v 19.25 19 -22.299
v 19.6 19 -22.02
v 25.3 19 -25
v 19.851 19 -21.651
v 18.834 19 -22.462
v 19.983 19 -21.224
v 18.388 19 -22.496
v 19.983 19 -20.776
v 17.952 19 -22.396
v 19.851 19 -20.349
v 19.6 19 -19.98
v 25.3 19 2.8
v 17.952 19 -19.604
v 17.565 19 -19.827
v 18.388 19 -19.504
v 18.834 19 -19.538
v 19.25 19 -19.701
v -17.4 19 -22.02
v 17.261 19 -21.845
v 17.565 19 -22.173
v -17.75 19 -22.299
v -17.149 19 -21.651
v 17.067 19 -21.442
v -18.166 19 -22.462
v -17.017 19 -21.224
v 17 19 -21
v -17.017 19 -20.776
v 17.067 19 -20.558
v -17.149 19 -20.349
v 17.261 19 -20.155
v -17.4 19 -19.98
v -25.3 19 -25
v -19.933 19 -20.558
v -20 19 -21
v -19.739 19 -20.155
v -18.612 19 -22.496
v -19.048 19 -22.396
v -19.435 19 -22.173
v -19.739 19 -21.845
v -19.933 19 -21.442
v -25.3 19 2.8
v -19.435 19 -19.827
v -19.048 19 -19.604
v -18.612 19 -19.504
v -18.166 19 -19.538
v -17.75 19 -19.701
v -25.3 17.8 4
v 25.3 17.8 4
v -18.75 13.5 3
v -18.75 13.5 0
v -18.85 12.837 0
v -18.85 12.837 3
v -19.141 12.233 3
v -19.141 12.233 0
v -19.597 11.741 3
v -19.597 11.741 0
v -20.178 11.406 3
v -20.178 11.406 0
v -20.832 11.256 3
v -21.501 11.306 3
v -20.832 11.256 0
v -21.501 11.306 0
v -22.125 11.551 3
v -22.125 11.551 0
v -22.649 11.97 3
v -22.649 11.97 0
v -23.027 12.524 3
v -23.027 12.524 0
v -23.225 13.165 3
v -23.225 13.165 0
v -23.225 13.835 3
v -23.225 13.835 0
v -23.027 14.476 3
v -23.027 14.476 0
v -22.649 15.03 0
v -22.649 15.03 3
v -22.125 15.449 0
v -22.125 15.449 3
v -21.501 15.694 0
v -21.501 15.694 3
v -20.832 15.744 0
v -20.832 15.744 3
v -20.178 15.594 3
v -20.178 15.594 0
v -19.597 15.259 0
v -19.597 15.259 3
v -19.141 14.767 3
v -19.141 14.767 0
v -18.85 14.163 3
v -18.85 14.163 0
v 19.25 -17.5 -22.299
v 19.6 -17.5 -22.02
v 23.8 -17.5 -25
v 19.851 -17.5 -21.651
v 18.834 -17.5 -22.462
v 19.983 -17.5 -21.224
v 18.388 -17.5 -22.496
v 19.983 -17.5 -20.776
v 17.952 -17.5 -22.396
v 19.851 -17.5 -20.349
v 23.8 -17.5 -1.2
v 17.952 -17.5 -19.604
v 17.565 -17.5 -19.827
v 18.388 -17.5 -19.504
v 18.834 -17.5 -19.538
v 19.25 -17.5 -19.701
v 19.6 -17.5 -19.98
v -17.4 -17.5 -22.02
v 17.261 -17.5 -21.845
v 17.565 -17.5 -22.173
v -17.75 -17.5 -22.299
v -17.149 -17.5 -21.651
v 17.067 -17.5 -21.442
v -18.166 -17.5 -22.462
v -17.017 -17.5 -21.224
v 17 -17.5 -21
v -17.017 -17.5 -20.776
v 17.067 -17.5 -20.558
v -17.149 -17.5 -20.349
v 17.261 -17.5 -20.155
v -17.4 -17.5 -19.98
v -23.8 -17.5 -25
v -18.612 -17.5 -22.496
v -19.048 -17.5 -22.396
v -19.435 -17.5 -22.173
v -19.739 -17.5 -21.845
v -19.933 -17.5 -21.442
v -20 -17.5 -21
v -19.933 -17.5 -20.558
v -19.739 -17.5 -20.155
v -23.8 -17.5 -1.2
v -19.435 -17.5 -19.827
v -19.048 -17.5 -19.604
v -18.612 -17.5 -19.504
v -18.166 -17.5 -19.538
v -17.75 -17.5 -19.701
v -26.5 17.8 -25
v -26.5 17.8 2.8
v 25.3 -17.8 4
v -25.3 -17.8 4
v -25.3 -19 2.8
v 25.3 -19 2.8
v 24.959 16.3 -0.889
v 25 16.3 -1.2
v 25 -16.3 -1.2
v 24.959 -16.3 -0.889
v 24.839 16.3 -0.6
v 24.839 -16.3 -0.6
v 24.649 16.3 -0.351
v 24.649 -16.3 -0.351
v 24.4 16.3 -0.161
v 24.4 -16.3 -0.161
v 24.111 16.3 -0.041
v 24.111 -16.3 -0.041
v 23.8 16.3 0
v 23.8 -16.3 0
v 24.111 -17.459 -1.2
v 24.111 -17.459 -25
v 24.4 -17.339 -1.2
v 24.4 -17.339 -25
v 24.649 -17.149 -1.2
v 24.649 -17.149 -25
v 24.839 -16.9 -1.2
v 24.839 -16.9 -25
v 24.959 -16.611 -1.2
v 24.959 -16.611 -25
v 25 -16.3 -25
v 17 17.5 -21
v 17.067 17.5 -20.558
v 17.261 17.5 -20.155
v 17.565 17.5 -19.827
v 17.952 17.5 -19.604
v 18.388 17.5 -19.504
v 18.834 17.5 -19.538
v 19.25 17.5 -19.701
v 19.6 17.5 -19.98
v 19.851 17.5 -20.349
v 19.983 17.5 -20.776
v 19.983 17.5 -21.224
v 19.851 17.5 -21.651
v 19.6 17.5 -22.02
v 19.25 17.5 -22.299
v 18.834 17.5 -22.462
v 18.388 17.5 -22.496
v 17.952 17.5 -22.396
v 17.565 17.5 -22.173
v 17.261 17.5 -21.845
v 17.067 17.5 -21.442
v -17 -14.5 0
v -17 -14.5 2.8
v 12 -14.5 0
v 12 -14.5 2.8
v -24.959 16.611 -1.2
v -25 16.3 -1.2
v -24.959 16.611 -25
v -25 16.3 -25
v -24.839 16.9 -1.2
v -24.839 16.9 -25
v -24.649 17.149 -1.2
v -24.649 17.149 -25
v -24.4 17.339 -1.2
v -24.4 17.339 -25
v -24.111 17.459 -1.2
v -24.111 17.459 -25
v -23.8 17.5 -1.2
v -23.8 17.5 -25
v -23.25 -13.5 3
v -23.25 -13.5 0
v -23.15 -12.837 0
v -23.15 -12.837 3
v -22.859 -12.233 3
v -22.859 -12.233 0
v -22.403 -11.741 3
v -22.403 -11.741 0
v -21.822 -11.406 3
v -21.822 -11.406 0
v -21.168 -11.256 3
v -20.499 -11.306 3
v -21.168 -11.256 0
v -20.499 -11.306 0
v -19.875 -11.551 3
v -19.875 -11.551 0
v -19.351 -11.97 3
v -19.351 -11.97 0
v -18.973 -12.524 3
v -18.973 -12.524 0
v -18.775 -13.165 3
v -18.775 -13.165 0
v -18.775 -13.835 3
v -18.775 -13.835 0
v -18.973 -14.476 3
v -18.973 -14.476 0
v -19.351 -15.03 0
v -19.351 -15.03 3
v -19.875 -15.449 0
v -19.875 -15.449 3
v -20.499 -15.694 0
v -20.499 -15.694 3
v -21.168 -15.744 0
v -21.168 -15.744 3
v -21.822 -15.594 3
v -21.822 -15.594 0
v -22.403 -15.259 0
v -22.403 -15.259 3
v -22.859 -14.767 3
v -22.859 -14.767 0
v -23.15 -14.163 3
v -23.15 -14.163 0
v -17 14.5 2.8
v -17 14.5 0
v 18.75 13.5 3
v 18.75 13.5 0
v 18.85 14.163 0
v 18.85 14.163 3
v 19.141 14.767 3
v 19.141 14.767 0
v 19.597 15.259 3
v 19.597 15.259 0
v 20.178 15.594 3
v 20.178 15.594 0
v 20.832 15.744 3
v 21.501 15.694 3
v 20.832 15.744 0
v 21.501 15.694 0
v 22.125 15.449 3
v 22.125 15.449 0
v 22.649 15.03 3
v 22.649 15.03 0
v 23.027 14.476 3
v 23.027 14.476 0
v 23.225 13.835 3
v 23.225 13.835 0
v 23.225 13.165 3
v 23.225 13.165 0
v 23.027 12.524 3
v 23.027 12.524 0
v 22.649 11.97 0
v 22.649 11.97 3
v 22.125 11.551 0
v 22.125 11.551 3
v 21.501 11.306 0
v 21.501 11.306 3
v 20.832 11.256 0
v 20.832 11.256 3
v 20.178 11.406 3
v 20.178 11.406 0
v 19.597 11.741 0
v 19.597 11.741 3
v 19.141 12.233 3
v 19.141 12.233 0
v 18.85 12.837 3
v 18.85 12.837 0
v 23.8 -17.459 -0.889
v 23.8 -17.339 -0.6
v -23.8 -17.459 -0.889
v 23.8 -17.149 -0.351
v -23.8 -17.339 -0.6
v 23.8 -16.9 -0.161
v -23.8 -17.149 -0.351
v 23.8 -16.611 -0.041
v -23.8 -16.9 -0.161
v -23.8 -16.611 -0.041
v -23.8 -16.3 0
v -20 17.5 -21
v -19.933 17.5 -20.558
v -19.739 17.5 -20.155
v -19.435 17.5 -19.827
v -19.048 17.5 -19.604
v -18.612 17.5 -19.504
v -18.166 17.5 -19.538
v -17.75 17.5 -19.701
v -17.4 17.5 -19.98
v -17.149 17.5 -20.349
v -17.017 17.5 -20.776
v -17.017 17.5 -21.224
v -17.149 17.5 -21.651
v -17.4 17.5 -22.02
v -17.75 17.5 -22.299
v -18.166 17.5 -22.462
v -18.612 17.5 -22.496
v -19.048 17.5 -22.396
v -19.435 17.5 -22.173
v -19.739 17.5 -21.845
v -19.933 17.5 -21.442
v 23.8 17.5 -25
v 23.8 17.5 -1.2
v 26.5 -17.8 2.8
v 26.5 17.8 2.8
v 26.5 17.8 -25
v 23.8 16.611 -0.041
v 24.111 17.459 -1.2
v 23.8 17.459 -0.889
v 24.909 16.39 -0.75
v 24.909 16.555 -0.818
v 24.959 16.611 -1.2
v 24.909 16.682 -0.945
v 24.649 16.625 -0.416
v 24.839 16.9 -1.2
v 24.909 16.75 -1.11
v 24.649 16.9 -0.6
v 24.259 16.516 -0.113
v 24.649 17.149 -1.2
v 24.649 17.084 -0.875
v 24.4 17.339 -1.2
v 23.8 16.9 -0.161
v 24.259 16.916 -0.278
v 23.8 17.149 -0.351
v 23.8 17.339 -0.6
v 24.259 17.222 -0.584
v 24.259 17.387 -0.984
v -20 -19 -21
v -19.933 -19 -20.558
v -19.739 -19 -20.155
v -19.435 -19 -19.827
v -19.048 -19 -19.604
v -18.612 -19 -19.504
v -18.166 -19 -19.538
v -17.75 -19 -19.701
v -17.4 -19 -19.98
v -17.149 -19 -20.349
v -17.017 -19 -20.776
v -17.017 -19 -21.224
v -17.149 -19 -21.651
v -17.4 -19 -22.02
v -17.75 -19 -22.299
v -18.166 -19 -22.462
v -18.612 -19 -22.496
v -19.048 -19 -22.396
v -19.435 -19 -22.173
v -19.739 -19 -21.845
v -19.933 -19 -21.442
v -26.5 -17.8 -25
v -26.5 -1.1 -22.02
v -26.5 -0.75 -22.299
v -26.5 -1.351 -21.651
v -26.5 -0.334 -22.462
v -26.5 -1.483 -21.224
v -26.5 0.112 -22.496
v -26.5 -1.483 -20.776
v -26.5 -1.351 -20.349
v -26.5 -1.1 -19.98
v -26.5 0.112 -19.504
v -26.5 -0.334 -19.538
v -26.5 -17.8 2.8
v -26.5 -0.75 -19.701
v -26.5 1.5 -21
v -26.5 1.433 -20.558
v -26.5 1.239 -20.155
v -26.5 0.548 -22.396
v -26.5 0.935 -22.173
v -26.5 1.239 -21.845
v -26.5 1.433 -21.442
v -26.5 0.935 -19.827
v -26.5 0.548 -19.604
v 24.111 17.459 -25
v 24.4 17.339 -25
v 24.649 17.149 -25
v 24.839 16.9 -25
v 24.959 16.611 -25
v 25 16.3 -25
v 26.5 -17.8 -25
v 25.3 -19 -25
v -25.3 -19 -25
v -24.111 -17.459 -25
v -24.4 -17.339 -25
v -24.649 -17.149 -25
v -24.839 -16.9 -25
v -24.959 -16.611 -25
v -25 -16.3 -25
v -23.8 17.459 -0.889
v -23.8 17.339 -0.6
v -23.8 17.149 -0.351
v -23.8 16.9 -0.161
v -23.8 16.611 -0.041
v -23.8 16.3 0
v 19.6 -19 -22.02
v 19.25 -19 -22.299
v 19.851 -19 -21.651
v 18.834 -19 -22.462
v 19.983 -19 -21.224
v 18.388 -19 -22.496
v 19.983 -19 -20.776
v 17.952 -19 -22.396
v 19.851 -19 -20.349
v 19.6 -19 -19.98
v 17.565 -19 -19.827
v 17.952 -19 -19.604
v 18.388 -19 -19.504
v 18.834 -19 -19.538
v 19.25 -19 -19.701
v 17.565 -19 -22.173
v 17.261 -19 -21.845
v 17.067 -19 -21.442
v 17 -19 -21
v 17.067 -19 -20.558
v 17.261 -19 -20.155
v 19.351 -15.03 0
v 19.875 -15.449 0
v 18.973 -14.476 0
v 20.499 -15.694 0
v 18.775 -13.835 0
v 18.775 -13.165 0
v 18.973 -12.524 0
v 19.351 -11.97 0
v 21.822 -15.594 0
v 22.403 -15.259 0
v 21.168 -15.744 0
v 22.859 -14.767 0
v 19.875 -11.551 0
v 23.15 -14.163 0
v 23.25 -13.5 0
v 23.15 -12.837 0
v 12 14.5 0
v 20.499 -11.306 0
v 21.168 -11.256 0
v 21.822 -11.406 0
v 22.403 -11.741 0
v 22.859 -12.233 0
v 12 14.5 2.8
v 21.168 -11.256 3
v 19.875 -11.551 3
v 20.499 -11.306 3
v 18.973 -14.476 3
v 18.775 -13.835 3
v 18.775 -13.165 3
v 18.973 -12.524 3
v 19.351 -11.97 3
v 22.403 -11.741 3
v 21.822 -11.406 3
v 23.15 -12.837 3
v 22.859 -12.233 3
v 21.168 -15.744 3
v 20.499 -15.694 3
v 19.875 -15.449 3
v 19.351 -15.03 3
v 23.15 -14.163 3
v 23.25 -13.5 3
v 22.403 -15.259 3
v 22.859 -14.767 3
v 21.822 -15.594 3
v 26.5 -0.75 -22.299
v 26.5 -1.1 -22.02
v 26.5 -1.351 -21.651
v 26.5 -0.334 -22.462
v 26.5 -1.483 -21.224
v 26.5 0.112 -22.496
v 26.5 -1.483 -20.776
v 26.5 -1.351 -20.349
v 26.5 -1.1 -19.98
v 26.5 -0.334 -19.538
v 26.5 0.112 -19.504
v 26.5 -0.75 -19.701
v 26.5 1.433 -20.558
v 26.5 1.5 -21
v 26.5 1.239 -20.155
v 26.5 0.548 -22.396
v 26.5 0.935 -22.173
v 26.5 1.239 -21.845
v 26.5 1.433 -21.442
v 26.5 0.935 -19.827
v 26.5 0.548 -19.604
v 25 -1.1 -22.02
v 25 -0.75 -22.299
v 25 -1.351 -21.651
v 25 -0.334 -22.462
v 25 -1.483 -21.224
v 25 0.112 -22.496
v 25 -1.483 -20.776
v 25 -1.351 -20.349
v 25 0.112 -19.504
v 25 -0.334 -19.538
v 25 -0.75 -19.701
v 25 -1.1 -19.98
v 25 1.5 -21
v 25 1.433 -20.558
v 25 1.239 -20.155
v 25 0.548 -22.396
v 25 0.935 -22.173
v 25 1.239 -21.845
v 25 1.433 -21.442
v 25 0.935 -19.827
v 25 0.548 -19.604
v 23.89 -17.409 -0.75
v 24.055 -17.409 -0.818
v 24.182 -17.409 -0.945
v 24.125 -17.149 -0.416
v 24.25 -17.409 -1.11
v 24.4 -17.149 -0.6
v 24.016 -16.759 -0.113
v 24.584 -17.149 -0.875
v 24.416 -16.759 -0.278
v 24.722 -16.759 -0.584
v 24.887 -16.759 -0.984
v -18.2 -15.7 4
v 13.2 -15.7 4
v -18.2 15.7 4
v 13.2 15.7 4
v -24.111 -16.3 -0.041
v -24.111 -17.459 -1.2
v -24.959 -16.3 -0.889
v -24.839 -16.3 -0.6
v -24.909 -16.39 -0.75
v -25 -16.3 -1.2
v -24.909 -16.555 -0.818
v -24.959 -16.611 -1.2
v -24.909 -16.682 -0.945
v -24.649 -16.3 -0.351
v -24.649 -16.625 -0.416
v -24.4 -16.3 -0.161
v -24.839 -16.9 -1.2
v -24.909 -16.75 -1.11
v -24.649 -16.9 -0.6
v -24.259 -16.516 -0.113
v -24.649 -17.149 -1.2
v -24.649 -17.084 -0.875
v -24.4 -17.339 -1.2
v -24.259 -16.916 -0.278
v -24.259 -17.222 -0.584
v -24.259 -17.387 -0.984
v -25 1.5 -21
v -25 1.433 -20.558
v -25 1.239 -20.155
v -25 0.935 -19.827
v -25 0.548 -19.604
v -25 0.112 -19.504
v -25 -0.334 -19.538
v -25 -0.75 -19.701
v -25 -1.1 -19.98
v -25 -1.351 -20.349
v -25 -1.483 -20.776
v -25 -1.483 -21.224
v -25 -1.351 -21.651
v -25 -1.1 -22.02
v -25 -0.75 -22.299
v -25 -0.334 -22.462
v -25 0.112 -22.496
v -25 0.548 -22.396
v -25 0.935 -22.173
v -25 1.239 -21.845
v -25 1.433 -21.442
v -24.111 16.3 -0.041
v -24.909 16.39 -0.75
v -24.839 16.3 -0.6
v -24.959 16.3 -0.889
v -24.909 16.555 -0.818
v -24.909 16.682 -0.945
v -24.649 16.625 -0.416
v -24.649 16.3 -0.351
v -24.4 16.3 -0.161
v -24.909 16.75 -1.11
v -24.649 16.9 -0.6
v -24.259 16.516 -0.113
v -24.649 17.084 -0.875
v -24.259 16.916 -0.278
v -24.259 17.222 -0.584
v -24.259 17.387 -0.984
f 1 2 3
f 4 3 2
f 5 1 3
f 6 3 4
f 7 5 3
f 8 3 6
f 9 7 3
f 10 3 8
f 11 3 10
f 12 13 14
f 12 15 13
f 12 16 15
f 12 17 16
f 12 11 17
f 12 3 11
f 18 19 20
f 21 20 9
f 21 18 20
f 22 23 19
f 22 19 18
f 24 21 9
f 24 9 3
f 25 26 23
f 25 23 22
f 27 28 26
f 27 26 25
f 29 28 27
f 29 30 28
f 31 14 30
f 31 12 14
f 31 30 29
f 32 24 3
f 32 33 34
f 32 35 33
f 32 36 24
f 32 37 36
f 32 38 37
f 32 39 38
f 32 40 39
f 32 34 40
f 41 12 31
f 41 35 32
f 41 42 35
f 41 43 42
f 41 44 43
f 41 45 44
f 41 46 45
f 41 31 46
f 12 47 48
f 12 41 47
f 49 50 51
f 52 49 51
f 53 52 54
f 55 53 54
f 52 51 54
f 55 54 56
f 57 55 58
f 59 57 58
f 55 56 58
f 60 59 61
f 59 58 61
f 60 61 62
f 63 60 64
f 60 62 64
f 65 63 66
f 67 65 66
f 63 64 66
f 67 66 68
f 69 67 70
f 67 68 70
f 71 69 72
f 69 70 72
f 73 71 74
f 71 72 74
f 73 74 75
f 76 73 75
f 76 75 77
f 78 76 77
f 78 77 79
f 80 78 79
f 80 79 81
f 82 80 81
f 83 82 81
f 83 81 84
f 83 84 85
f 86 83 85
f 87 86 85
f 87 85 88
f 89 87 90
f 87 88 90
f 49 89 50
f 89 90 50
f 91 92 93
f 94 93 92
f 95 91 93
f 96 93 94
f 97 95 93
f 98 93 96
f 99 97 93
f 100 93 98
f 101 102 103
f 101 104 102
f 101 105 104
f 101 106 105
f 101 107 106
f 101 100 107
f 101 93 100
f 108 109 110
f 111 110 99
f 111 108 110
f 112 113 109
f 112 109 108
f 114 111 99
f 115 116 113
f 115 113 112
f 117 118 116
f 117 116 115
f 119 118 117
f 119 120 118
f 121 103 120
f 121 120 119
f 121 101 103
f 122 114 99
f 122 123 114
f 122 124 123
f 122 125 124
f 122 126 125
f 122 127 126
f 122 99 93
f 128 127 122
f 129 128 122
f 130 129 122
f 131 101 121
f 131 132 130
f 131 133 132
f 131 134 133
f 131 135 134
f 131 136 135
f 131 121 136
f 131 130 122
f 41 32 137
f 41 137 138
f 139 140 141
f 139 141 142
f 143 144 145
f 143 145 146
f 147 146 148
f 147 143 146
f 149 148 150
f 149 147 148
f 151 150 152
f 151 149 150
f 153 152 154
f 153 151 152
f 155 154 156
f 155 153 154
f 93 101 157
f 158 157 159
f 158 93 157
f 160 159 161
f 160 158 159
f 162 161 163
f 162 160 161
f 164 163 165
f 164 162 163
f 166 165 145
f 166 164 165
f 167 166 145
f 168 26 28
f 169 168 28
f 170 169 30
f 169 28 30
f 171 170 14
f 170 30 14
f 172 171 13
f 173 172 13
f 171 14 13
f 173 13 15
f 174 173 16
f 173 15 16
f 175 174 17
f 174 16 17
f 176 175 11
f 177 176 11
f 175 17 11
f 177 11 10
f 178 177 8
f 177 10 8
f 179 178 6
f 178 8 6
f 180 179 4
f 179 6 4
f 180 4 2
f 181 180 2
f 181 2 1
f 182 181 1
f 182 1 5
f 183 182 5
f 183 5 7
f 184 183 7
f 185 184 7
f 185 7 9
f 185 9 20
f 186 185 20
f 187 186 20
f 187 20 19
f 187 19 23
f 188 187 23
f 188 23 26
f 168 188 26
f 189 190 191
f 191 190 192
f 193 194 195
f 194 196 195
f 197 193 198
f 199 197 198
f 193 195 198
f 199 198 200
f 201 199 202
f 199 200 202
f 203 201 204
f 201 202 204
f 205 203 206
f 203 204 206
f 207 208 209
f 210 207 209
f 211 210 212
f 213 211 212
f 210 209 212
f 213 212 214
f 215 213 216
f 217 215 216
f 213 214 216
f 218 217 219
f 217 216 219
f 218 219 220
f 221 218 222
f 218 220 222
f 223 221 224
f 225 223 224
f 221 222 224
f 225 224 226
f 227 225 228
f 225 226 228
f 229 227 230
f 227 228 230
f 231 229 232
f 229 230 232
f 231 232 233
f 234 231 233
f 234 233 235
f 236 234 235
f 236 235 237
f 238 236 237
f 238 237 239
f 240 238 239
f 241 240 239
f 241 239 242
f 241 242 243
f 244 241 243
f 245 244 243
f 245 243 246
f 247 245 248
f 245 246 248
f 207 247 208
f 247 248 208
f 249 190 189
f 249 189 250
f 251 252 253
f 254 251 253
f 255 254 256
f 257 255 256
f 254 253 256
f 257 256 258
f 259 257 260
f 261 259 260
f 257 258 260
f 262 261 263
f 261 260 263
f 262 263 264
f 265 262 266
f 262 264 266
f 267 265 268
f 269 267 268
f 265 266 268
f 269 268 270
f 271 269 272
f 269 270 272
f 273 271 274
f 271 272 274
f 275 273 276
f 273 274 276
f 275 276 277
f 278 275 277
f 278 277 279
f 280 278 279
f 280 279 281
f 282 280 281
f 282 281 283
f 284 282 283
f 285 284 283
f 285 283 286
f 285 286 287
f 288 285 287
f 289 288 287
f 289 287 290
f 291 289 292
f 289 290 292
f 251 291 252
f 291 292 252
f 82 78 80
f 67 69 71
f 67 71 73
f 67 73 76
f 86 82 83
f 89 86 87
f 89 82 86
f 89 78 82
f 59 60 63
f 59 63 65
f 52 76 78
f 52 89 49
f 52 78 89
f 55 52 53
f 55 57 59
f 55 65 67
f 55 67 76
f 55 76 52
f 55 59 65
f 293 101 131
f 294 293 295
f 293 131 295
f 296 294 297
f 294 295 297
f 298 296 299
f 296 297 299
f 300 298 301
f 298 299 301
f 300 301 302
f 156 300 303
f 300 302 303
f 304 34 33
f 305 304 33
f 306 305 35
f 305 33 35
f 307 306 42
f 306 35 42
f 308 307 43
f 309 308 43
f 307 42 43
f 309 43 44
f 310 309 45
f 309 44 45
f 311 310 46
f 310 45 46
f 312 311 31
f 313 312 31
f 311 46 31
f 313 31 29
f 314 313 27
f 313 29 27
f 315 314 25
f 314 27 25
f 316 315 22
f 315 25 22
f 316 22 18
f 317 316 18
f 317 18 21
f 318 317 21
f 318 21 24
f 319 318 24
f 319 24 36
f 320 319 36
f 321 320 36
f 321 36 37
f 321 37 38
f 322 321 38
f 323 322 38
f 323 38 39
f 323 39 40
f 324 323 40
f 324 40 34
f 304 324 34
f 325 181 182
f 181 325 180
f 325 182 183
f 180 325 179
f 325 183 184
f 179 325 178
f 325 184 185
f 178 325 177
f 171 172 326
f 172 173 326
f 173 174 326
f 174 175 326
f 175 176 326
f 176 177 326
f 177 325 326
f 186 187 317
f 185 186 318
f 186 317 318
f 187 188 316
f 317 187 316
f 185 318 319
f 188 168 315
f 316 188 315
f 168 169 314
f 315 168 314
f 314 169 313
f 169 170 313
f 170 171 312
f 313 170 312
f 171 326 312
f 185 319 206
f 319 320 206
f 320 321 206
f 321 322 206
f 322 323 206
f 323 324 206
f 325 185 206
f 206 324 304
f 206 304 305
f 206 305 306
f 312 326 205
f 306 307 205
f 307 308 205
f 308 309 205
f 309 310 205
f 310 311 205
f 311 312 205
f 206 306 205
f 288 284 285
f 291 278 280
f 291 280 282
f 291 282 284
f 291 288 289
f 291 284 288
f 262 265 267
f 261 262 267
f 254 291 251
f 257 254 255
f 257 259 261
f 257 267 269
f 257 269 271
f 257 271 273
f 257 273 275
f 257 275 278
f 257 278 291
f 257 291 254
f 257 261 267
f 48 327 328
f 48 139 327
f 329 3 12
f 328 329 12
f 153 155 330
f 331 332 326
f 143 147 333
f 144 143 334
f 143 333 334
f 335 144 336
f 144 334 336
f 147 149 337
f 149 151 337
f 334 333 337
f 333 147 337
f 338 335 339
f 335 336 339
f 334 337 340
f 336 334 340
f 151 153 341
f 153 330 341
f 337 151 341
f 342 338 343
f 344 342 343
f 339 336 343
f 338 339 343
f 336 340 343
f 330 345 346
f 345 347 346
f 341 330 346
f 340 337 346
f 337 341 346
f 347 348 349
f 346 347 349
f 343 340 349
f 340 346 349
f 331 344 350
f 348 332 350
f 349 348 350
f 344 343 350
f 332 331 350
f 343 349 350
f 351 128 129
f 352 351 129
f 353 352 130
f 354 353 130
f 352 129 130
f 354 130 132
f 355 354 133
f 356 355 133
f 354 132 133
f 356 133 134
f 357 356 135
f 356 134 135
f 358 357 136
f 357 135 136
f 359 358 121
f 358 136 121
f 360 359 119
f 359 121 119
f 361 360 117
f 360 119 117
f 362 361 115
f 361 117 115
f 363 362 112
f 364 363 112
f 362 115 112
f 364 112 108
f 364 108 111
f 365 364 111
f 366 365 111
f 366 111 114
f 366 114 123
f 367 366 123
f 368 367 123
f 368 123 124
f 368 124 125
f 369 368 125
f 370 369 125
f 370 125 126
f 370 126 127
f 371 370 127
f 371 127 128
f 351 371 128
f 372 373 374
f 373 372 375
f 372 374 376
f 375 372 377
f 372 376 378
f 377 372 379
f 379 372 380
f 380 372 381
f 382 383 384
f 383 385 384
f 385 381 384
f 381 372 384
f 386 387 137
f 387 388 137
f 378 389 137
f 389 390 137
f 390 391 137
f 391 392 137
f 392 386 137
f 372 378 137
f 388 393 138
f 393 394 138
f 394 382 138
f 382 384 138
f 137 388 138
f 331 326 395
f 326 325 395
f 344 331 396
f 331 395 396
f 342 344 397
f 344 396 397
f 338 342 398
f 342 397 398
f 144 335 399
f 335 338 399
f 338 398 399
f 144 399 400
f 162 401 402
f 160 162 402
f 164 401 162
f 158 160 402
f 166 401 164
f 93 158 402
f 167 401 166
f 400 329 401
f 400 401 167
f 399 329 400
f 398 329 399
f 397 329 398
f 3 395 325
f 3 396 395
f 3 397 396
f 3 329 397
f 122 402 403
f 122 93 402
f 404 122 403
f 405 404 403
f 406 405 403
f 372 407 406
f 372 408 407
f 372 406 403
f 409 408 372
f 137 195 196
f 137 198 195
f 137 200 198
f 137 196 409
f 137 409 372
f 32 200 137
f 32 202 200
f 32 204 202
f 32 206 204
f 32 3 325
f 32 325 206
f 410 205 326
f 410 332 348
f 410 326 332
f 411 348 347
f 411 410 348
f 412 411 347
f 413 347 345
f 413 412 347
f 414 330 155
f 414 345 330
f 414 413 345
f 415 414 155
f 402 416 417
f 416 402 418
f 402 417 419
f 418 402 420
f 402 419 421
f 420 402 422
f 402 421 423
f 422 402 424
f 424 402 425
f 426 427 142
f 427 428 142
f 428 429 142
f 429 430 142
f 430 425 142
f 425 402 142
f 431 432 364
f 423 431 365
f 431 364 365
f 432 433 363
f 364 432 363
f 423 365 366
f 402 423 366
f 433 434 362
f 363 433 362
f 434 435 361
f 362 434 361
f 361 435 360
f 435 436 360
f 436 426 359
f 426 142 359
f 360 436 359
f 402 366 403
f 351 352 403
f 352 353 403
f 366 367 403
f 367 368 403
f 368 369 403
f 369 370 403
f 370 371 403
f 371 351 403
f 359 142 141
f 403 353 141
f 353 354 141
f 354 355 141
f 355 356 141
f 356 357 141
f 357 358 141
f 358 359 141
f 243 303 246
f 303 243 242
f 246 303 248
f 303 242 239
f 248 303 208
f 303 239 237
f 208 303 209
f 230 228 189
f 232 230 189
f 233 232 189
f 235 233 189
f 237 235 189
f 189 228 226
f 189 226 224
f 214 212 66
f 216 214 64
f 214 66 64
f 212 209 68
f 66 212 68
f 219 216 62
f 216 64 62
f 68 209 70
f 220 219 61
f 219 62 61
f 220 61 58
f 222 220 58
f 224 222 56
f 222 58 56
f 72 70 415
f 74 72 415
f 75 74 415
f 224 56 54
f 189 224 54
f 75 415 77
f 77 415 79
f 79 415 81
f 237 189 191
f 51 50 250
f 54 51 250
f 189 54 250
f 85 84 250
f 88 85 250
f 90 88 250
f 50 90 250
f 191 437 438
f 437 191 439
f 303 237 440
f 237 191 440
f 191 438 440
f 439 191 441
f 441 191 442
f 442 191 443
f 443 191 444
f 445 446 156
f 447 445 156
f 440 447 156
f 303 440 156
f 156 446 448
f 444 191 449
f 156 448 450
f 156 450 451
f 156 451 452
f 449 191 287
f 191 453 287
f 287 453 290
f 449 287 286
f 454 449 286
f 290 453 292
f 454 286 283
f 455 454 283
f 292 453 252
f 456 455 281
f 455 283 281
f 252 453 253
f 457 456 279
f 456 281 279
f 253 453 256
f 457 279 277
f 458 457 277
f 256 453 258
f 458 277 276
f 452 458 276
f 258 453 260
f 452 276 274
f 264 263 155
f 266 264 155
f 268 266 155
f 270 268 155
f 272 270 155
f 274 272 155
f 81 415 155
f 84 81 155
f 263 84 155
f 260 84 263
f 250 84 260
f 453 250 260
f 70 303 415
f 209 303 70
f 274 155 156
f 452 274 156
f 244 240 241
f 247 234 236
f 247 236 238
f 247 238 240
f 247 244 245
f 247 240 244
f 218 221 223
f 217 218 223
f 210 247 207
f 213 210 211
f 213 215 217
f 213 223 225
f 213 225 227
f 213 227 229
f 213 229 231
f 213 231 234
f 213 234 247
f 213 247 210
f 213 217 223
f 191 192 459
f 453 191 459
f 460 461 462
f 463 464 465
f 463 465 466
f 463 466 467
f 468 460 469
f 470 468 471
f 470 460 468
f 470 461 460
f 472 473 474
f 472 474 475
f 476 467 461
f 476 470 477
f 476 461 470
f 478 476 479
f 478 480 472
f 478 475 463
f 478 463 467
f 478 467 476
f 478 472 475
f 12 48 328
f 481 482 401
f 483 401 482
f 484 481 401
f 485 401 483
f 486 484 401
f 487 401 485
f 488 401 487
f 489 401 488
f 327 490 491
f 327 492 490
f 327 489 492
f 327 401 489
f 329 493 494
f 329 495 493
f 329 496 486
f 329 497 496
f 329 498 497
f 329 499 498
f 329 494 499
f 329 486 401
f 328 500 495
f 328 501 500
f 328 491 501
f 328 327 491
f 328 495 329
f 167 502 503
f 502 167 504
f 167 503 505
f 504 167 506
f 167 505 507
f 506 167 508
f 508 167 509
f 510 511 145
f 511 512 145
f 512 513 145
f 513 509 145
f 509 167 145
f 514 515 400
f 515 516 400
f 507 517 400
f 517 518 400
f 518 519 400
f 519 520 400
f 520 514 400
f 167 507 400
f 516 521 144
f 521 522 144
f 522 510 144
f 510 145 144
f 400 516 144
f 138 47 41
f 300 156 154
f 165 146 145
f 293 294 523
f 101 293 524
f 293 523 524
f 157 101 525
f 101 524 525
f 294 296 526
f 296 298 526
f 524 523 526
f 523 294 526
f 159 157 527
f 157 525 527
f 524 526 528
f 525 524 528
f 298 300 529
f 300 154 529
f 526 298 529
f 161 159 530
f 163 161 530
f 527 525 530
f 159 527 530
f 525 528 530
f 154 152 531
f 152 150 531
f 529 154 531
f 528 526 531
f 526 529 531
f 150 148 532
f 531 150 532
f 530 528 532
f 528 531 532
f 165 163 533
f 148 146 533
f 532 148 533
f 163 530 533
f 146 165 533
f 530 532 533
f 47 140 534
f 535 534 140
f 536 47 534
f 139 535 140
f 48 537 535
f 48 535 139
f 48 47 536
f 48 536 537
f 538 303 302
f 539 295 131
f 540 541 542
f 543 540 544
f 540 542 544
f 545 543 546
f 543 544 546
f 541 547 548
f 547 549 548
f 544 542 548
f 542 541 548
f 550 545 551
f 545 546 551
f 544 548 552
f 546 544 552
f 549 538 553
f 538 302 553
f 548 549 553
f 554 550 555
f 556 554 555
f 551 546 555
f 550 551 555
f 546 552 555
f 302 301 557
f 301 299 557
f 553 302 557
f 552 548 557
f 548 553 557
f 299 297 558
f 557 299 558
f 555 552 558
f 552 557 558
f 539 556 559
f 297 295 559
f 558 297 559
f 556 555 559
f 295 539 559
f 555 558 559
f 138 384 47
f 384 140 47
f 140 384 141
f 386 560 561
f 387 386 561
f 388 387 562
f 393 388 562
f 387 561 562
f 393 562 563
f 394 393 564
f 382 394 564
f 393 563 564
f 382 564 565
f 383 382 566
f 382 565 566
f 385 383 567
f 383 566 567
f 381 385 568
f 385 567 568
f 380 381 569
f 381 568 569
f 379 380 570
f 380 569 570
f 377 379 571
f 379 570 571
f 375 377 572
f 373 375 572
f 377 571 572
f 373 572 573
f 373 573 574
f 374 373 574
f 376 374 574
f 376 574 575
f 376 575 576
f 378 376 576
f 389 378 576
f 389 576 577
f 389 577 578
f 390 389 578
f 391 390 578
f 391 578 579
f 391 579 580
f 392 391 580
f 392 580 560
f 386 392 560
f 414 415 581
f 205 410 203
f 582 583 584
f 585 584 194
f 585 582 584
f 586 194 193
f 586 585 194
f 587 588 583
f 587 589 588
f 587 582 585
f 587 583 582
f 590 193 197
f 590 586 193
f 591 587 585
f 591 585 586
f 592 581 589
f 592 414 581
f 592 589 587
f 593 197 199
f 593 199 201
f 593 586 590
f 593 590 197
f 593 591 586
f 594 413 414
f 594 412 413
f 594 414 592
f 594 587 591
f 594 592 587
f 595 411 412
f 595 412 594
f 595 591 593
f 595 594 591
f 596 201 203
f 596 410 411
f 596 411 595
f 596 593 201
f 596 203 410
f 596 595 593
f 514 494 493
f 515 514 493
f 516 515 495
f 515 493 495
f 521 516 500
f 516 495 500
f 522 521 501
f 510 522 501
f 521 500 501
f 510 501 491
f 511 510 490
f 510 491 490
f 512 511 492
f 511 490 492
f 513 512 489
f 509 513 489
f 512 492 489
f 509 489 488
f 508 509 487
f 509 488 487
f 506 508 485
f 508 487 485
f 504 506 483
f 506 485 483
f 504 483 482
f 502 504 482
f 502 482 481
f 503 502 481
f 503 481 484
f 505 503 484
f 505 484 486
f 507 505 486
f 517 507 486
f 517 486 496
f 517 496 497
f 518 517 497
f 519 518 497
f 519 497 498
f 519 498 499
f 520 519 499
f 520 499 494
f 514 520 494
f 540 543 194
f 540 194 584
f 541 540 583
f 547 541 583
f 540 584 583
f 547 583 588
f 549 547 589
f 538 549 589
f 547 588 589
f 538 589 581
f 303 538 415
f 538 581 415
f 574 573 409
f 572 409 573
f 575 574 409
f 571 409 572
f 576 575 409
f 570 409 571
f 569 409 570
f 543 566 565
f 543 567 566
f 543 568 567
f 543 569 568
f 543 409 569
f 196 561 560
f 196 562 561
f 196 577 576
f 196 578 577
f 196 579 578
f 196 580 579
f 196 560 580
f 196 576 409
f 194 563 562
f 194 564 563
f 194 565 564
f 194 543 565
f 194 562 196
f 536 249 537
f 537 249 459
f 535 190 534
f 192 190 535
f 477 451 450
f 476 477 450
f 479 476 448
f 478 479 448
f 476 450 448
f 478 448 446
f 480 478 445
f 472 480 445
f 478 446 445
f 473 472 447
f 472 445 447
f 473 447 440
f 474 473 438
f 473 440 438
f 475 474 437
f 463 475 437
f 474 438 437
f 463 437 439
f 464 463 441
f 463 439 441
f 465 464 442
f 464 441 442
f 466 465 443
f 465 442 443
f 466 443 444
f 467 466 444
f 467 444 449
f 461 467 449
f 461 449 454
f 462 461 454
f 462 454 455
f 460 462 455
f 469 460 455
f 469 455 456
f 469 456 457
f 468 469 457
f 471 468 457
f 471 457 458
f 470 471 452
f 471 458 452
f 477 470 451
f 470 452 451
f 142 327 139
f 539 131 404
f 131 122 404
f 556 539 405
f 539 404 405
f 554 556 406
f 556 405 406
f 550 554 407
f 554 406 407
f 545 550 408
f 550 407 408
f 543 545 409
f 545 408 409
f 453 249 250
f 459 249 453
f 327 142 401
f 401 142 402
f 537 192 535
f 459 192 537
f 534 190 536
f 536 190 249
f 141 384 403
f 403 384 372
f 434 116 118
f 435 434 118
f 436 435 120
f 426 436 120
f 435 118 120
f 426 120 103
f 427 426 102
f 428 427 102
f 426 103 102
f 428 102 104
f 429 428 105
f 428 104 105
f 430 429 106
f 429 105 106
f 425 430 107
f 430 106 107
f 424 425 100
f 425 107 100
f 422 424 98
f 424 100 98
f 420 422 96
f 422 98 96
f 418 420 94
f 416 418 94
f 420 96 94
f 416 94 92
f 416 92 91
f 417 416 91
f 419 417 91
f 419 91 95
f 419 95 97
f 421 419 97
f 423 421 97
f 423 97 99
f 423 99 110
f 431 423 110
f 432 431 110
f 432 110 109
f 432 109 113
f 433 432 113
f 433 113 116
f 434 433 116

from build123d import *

# Parameters (mm, degrees)
ESQUISSE1_W                  = 53
ESQUISSE1_H                  = 38
BASE_DEPTH                   = 4
ESQUISSE2_W                  = 29
ESQUISSE2_H                  = 29
SCREEN_DEPTH                 = 4
ESQUISSE5_R                  = 2.25
INSERTS_M3_DEPTH             = 3
ESQUISSE6_W                  = 53
ESQUISSE6_H                  = 38
ESQUISSE6_W_2                = 50
ESQUISSE6_H_2                = 35
WALLS_DEPTH                  = 25
CHANFREIN_EXT_SIZE           = 1.2
CONG_1_R                     = 1.2
ESQUISSE7_R                  = 1.5
PASSAGE_VIS_HORIZONTAL_DEPTH = 62.603571325
ESQUISSE9_R                  = 1.5
PASSAGE_VIS_VERTICAL_DEPTH   = 53.642663306


with BuildPart() as part:
    # Esquisse1 → BASE (new body)
    with BuildSketch(Plane.XY):
        Rectangle(ESQUISSE1_W, ESQUISSE1_H)
    extrude(amount=BASE_DEPTH)

    # Esquisse2 → Screen (cut)
    with BuildSketch(Plane.XY.offset(4)):
        with Locations((-2.5, 0)):
            Rectangle(ESQUISSE2_W, ESQUISSE2_H)
    extrude(amount=-SCREEN_DEPTH, mode=Mode.SUBTRACT)

    # Esquisse5 → Inserts_M3 (cut)
    with BuildSketch(Plane(origin=(0, 0, 0), x_dir=(-1, 0, 0), z_dir=(0, 0, -1))):
        with Locations((-21, 13.5)):
            Circle(ESQUISSE5_R)
        with Locations(Location((-21, -13.5, 0), (0, 0, 180))):
            Circle(ESQUISSE5_R)
        with Locations((21, -13.5)):
            Circle(ESQUISSE5_R)
        with Locations(Location((21, 13.5, 0), (0, 0, 180))):
            Circle(ESQUISSE5_R)
    extrude(amount=-INSERTS_M3_DEPTH, mode=Mode.SUBTRACT)

    # Esquisse6 → Walls (add)
    with BuildSketch(Plane(origin=(0, 0, 0), x_dir=(-1, 0, 0), z_dir=(0, 0, -1))):
        Rectangle(ESQUISSE6_W, ESQUISSE6_H)
        Rectangle(ESQUISSE6_W_2, ESQUISSE6_H_2, mode=Mode.SUBTRACT)
    extrude(amount=WALLS_DEPTH)

    # Chanfrein_EXT
    chanfrein_ext_edges = [part.edges().sort_by_distance(p)[0] for p in [
        (26.5, 0, 4),
        (0, 19, 4),
        (-17, 0, 4),
        (-2.5, -14.5, 4),
        (12, 0, 4),
        (-2.5, 14.5, 4),
        (-26.5, 0, 4),
        (-26.5, 19, -10.5),
        (26.5, 19, -10.5),
        (26.5, -19, -10.5),
        (-26.5, -19, -10.5),
        (0, -19, 4),
    ]]
    chamfer(chanfrein_ext_edges, length=CHANFREIN_EXT_SIZE)

    # Congé1
    cong_1_edges = [part.edges().sort_by_distance(p)[0] for p in [
        (0, 17.5, 0),
        (25, 0, 0),
        (0, -17.5, 0),
        (-25, 0, 0),
        (25, 17.5, -12.5),
        (25, -17.5, -12.5),
        (-25, -17.5, -12.5),
        (-25, 17.5, -12.5),
    ]]
    fillet(cong_1_edges, radius=CONG_1_R)

    # Esquisse7 → Passage_Vis_Horizontal (cut, through all)
    with BuildSketch(Plane(origin=(26.5, 0, 0), x_dir=(0, 0, -1), z_dir=(1, 0, 0))):
        with Locations(Location((21, 0, 0), (0, 0, 90))):
            Circle(ESQUISSE7_R)
    extrude(amount=-PASSAGE_VIS_HORIZONTAL_DEPTH, mode=Mode.SUBTRACT)

    # Esquisse9 → Passage_Vis_Vertical (cut, through all)
    with BuildSketch(Plane(origin=(0, 19, 0), x_dir=(1, 0, 0), z_dir=(0, 1, 0))):
        with Locations(Location((-18.5, 21, 0), (0, 0, 180))):
            Circle(ESQUISSE9_R)
        with Locations(Location((18.5, 21, 0), (0, 0, 180))):
            Circle(ESQUISSE9_R)
    extrude(amount=-PASSAGE_VIS_VERTICAL_DEPTH, mode=Mode.SUBTRACT)


solid = part.part
